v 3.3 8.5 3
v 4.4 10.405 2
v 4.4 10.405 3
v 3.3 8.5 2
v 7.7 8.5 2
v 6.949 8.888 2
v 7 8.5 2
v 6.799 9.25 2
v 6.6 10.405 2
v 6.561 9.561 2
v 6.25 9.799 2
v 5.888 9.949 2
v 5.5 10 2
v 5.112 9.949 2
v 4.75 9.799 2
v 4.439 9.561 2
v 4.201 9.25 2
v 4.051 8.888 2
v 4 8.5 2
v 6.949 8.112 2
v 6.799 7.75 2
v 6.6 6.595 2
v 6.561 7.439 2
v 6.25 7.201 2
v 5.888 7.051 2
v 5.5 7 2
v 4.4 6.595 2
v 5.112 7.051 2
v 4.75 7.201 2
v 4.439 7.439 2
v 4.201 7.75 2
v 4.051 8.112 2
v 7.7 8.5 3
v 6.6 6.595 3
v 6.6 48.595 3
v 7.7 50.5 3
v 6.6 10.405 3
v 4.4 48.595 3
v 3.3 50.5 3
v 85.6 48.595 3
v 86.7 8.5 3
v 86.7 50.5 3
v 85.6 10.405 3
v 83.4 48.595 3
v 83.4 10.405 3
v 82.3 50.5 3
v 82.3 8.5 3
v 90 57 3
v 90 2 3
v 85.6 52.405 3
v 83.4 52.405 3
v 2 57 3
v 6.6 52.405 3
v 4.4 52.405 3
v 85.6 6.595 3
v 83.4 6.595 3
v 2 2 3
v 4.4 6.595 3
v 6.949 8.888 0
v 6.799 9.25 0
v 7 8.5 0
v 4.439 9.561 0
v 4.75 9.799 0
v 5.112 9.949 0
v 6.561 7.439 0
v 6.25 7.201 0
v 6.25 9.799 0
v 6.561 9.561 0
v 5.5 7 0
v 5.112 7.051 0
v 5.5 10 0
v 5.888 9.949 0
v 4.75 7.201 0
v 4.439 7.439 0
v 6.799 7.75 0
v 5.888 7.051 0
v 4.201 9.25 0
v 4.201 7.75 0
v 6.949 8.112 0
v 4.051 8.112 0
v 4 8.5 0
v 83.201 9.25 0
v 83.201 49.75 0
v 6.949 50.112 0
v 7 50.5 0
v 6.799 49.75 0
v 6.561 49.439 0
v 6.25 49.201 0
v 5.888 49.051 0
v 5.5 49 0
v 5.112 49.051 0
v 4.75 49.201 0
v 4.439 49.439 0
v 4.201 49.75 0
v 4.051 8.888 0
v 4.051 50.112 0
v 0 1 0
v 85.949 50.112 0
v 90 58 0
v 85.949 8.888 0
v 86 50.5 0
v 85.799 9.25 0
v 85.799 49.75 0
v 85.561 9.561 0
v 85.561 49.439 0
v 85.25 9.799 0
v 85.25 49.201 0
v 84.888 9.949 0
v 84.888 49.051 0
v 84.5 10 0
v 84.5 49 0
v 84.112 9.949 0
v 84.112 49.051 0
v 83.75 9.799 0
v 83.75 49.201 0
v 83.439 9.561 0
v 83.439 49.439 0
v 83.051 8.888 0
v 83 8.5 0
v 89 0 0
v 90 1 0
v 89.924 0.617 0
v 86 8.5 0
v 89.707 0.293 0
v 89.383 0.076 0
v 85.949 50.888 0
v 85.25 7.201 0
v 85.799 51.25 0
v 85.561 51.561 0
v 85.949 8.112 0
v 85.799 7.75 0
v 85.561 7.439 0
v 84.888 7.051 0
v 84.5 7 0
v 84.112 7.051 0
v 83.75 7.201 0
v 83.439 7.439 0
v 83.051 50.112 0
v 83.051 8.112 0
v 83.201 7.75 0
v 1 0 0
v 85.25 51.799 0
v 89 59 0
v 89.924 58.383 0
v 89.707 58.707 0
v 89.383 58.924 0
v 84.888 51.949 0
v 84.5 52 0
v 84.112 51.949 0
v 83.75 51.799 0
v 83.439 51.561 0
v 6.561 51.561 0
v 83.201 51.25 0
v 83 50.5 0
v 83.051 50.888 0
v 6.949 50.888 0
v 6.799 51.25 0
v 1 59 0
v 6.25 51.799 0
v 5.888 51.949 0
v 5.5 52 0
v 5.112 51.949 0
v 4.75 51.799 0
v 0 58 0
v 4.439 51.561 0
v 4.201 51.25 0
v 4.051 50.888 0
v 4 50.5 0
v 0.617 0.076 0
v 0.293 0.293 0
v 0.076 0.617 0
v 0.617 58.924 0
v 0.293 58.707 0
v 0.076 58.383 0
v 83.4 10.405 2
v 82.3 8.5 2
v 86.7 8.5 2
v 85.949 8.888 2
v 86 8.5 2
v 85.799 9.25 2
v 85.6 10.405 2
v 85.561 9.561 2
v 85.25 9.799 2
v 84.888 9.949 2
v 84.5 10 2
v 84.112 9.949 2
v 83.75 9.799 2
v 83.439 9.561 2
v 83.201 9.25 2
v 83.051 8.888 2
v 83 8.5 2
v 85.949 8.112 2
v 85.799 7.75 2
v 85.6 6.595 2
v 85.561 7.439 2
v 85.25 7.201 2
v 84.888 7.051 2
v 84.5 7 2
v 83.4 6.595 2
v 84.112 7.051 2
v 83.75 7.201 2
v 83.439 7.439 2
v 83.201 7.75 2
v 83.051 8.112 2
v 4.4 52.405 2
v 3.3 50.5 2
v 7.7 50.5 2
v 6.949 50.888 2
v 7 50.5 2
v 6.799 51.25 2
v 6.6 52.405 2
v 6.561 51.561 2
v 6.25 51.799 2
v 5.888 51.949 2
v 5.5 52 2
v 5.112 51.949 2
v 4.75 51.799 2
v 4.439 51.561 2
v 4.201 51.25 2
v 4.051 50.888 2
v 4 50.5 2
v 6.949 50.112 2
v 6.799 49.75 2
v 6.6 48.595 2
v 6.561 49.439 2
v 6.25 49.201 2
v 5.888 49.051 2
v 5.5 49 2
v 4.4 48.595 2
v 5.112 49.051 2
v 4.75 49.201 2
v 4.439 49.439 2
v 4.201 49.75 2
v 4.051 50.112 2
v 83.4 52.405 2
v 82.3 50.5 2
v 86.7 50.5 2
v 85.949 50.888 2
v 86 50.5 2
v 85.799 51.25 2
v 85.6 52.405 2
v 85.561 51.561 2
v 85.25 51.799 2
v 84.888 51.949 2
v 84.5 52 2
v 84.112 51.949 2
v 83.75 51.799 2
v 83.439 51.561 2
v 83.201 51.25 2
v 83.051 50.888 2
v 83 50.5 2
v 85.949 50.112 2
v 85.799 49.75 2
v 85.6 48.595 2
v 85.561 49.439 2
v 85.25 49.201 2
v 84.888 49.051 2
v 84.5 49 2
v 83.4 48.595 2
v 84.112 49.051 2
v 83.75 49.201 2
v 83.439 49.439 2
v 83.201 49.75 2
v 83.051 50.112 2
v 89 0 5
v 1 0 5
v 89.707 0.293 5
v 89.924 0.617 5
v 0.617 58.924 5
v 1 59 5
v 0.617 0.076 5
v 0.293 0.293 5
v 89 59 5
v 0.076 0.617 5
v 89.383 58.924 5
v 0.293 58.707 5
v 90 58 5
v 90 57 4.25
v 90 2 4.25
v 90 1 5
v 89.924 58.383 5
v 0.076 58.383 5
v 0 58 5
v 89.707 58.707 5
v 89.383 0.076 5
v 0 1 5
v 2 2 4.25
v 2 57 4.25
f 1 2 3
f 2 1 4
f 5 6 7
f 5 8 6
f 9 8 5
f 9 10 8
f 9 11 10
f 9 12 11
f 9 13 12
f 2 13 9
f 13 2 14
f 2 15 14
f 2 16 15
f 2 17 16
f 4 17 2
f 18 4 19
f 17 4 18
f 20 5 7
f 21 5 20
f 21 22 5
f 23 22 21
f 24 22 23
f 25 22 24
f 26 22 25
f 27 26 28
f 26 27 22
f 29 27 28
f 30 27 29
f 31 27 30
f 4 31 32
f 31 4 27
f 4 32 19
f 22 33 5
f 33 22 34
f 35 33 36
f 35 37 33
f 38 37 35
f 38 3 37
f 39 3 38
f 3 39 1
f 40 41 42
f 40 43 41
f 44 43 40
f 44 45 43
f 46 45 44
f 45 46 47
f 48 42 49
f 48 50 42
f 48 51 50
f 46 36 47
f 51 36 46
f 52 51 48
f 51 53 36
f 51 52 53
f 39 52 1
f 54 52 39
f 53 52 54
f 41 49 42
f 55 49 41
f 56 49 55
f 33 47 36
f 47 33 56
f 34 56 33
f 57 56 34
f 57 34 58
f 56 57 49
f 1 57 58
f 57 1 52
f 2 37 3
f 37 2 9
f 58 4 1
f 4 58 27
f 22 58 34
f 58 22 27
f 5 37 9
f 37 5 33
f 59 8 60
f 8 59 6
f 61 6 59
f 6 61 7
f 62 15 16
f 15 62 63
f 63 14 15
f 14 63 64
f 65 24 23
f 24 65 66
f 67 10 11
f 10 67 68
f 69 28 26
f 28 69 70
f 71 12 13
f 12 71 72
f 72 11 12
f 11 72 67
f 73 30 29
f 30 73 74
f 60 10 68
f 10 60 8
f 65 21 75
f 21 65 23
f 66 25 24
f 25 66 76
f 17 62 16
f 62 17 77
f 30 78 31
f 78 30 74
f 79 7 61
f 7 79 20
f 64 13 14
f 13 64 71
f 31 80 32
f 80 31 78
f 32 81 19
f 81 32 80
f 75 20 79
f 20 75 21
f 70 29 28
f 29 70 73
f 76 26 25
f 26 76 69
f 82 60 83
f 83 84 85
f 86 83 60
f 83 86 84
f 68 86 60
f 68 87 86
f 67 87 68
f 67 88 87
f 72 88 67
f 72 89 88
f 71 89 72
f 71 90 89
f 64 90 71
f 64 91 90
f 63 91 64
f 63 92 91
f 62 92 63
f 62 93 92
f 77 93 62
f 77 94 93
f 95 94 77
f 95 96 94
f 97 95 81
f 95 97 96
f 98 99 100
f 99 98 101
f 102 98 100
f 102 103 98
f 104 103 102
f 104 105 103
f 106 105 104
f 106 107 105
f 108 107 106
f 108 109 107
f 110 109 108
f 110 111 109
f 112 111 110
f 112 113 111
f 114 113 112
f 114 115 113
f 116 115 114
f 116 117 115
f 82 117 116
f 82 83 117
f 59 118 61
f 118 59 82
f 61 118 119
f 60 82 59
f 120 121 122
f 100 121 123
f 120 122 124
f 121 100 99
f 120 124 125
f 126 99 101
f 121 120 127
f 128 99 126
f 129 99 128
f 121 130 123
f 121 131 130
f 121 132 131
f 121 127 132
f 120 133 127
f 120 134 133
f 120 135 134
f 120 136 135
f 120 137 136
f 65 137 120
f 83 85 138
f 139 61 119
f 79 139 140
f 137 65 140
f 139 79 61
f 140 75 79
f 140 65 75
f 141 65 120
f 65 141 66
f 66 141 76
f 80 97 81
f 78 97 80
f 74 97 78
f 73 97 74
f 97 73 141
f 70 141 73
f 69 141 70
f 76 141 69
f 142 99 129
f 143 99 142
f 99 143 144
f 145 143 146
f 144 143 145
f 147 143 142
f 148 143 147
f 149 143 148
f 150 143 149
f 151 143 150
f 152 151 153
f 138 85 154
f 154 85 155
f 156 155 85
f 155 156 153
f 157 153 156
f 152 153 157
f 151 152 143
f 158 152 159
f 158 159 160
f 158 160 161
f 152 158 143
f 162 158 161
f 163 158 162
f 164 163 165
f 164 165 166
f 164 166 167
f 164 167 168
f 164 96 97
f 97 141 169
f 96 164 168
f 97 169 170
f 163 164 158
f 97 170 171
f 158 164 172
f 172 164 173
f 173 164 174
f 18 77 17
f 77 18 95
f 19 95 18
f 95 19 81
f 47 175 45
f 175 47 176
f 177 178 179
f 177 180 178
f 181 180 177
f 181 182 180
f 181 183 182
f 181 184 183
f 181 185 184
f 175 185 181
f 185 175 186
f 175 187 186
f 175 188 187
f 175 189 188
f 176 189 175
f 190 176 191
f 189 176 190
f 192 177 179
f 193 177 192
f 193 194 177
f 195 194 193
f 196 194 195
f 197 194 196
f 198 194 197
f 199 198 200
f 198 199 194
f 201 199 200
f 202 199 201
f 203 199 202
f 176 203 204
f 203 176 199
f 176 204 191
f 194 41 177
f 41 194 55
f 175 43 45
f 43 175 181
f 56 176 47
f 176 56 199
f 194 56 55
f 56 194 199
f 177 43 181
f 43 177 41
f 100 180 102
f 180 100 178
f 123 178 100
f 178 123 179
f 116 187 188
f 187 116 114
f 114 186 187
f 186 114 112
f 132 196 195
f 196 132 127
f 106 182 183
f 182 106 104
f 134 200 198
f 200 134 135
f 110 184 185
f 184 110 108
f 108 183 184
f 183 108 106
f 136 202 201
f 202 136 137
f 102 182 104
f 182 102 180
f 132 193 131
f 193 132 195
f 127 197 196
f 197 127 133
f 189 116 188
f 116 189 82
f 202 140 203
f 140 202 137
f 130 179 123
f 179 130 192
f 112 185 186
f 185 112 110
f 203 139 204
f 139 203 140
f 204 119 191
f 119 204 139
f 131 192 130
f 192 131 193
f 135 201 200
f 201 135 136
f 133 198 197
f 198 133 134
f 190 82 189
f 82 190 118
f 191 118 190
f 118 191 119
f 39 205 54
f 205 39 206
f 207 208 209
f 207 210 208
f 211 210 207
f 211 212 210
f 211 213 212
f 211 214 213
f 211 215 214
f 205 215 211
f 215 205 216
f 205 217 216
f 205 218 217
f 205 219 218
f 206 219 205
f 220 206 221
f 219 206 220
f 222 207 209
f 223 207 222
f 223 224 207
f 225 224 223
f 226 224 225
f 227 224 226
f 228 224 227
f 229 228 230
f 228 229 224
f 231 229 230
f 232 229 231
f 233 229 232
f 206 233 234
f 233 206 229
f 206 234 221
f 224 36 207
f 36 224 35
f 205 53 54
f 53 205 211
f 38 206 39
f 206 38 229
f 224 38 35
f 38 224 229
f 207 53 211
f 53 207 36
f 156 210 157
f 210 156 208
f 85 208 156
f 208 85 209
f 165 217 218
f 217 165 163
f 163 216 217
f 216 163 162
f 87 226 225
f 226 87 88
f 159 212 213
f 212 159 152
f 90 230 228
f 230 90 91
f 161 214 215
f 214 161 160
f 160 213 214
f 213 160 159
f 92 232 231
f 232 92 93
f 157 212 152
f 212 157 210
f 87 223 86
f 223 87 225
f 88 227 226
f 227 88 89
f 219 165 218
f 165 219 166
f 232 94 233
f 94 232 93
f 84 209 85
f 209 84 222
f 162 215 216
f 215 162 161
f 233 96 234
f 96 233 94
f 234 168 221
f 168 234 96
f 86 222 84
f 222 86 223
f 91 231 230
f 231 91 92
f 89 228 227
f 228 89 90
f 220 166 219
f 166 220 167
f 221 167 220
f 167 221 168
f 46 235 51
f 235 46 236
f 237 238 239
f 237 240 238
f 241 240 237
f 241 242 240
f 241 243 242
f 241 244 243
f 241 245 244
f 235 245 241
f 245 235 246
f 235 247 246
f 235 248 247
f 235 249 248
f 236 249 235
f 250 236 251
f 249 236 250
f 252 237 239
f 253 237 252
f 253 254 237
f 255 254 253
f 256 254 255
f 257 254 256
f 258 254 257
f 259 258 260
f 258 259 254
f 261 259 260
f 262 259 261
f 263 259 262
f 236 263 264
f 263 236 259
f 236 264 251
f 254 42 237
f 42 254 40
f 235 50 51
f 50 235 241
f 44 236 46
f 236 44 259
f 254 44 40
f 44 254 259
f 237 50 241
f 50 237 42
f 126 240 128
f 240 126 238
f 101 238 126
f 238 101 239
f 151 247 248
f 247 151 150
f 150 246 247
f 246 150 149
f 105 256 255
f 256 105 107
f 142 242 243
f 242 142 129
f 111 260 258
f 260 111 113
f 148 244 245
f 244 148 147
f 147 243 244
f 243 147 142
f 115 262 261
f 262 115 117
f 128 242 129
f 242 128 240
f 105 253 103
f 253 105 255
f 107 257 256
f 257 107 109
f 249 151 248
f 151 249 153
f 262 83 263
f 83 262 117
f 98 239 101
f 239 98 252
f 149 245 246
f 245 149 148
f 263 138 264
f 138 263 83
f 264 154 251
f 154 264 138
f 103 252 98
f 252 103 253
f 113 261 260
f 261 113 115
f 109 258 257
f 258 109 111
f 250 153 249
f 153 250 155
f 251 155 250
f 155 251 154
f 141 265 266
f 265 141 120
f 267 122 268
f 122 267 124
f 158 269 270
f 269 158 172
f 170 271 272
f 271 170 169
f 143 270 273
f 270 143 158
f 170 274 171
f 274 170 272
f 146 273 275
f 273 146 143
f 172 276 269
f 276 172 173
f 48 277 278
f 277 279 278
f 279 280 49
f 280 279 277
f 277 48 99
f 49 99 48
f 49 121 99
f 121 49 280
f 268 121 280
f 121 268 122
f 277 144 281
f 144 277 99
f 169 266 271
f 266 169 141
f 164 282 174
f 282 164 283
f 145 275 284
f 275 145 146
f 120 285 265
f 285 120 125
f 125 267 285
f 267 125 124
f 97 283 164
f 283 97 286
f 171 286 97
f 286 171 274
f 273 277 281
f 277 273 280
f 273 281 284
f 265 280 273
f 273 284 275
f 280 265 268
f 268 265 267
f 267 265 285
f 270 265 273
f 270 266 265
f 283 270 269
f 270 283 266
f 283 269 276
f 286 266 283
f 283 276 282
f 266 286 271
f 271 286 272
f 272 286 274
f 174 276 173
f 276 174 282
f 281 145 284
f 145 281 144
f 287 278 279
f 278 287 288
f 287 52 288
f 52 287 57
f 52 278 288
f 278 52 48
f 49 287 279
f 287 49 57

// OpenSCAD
// Render Control
$fa = 1;
$fs = 0.4;

// Dimensions: Badger
widthBadger = 86;
heightBadger = 49;

// Dimensions: Badger Plate
offsetHole = 2;
radiusHole = 1.5;

// Dimensions: ID Card
widthCard = 86;
heightCard = 55;
depthCard = 1.25;

// Dimensions: Fixings
lengthScrew = 3;
lengthNut = 1;
radiusNut = 2.2;

// Dimensions: General
radiusPlate = 1;
heightWall = 2;
bufferPlate = 2;
overhangWall = 2;

// Module: Hull
module hull_cyl() {
    cylinder(r=radiusPlate, h=lengthScrew + heightWall);
}

module hull_nut() {
    linear_extrude(height=lengthNut) {
        circle(r=radiusNut, $fn=6);
    }
    translate([0, 0, lengthNut - lengthScrew]) {
        cylinder(r=radiusHole, h=lengthScrew - lengthNut);
    }
}

// Model
render() {
    difference() {
        // Main Plate Body
        hull(){
            translate([radiusPlate, radiusPlate, 0]) {
                hull_cyl();
            }

            translate([widthCard + (2 * bufferPlate) - radiusPlate, radiusPlate, 0]) {
                hull_cyl();
            }

            translate([radiusPlate, heightCard + (2 * bufferPlate) - radiusPlate, 0]) {
                hull_cyl();
            }

            translate([widthCard + (2 * bufferPlate) - radiusPlate, heightCard + (2 * bufferPlate) - radiusPlate, 0]) {
                hull_cyl();
            }
        }

        // Subtract hole for screw/nut - bottom-left
        translate([bufferPlate + offsetHole + radiusHole, bufferPlate + ((heightCard - heightBadger) / 2) + offsetHole + radiusHole, lengthScrew - lengthNut]) {
            hull_nut();
        }

        // Subtract hole for screw/nut - bottom-right
        translate([bufferPlate + widthBadger - (offsetHole + radiusHole), bufferPlate + ((heightCard - heightBadger) / 2) + offsetHole + radiusHole, lengthScrew - lengthNut]) {
            hull_nut();
        }

        // Subtract hole for screw/nut - top-left
        translate([bufferPlate + offsetHole + radiusHole, bufferPlate + heightBadger + ((heightCard - heightBadger) / 2) - (offsetHole + radiusHole), lengthScrew - lengthNut]) {
            hull_nut();
        }

        // Subtract hole for screw/nut - top-right
        translate([bufferPlate + widthBadger - (offsetHole + radiusHole), bufferPlate + heightBadger + ((heightCard - heightBadger) / 2) - (offsetHole + radiusHole), lengthScrew - lengthNut]) {
            hull_nut();
        }

        // Subtract space for the card to sit in
        translate([bufferPlate, bufferPlate, lengthScrew]) {
            cube([widthCard + bufferPlate, heightCard, depthCard]);
        }

        // Subtract space for card to be visible through
 /*       translate([bufferPlate + overhangWall, bufferPlate + overhangWall, lengthScrew + depthCard]) {
            cube([widthCard - overhangWall, heightCard - (2 * overhangWall), heightWall - depthCard]);
        }
*/
 /*
        // Subtract right-hand portion of view fram to allow for card removal
        translate([bufferPlate + widthCard, bufferPlate + overhangWall, lengthScrew + depthCard]) {
            cube([bufferPlate, heightCard - (2 * overhangWall), heightWall - depthCard]);
        } */
    }
}
